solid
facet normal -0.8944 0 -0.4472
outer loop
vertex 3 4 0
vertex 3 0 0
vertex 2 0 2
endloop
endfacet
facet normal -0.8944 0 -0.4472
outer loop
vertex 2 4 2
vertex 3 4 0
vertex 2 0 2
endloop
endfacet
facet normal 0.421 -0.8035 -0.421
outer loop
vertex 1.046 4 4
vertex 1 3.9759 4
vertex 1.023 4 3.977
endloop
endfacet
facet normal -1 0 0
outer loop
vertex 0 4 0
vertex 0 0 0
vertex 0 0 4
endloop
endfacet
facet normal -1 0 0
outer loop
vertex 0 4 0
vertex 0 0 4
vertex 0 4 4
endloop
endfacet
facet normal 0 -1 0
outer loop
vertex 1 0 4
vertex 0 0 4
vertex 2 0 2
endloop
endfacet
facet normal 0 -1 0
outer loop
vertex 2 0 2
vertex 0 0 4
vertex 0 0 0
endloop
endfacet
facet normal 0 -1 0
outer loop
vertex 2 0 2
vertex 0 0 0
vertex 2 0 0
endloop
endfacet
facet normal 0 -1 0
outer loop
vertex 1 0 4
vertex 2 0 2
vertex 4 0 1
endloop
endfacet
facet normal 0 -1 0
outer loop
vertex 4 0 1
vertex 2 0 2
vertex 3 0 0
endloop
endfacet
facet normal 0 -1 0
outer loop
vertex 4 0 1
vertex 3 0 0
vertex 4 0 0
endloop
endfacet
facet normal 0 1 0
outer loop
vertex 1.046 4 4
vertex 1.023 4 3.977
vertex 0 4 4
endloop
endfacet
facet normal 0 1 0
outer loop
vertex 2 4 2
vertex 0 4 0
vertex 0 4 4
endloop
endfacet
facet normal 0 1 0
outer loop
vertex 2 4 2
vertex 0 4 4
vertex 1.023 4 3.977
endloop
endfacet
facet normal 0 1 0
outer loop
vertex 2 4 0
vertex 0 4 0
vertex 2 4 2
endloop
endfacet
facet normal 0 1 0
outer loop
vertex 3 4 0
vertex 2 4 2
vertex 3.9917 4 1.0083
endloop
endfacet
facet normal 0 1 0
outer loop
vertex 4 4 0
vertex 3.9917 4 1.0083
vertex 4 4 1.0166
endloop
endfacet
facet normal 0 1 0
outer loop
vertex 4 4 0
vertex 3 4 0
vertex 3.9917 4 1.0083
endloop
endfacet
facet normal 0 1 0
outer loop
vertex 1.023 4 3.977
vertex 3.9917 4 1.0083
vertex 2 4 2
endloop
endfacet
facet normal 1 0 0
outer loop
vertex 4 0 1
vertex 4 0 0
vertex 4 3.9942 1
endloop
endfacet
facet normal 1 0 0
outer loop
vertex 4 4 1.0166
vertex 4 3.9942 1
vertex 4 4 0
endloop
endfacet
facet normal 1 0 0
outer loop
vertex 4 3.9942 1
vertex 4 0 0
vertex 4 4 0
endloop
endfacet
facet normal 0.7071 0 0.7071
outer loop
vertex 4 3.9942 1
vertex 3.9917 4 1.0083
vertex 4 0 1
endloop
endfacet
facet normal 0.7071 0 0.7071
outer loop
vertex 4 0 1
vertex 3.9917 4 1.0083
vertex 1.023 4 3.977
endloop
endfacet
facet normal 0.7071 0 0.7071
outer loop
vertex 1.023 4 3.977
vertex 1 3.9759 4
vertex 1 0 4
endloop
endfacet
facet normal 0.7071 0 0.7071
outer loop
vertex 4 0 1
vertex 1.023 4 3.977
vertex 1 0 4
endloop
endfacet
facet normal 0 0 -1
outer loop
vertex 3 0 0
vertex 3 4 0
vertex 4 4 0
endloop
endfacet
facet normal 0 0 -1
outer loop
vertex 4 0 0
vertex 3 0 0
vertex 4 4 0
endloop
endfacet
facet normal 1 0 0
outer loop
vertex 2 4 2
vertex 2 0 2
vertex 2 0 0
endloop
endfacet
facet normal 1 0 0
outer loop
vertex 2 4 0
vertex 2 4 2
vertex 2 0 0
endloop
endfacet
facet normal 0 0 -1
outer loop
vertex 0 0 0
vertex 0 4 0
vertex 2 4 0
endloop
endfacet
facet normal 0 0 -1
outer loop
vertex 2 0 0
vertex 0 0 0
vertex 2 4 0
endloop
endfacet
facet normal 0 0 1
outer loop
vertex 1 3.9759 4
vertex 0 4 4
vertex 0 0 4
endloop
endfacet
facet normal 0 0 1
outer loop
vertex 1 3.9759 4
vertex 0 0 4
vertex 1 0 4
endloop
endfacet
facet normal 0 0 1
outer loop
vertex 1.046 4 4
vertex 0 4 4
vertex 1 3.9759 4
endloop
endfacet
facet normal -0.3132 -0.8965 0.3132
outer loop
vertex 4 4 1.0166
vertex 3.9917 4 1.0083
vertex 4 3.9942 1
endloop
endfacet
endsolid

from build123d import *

# Parameters (mm, degrees)
F0_W     = 4
F0_H     = 4
F1_DEPTH = 4
F3_DEPTH = 25
F8_DEPTH = 25


with BuildPart() as f1:
    # F0 (on Top) → F1 (new body)
    with BuildSketch(Plane.XY):
        with Locations((2, 2)):
            Rectangle(F0_W, F0_H)
    extrude(amount=F1_DEPTH)

    # F2 (on face) → F3 (cut)
    with BuildSketch(Plane.XZ):
        Polygon((2, 2), (2, 0), (3, 0), align=None)
    extrude(amount=-F3_DEPTH, mode=Mode.SUBTRACT)

    # F7 (on 3pt) → F8 (cut)
    with BuildSketch(Plane(origin=(2.5, 0, 2.5), x_dir=(0, -1, 0), z_dir=(-0.7071067812, 0, -0.7071067812))):
        Polygon((-1.2632596772, 0.4017388273), (0, 2.1224794909), (-3.9750006981, 2.1224794909), (-3.9823182922, 0.4017388273), align=None)
        Polygon((0, -2.1235230379), (0, 2.1224794909), (-1.2632596772, 0.4017388273), align=None)
        Polygon((-3.9930571802, -2.1235230379), (0, -2.1235230379), (-1.2632596772, 0.4017388273), (-3.9823182922, 0.4017388273), align=None)
        Polygon((-3.9823182922, 0.4017388273), (-3.9750006981, 2.1224794909), (-5.2508385852, 0.4017388273), align=None)
        Polygon((-5.2508385852, 0.4017388273), (-3.9930571802, -2.1235230379), (-3.9823182922, 0.4017388273), align=None)
    extrude(amount=-F8_DEPTH, mode=Mode.SUBTRACT)


solid = f1.part
